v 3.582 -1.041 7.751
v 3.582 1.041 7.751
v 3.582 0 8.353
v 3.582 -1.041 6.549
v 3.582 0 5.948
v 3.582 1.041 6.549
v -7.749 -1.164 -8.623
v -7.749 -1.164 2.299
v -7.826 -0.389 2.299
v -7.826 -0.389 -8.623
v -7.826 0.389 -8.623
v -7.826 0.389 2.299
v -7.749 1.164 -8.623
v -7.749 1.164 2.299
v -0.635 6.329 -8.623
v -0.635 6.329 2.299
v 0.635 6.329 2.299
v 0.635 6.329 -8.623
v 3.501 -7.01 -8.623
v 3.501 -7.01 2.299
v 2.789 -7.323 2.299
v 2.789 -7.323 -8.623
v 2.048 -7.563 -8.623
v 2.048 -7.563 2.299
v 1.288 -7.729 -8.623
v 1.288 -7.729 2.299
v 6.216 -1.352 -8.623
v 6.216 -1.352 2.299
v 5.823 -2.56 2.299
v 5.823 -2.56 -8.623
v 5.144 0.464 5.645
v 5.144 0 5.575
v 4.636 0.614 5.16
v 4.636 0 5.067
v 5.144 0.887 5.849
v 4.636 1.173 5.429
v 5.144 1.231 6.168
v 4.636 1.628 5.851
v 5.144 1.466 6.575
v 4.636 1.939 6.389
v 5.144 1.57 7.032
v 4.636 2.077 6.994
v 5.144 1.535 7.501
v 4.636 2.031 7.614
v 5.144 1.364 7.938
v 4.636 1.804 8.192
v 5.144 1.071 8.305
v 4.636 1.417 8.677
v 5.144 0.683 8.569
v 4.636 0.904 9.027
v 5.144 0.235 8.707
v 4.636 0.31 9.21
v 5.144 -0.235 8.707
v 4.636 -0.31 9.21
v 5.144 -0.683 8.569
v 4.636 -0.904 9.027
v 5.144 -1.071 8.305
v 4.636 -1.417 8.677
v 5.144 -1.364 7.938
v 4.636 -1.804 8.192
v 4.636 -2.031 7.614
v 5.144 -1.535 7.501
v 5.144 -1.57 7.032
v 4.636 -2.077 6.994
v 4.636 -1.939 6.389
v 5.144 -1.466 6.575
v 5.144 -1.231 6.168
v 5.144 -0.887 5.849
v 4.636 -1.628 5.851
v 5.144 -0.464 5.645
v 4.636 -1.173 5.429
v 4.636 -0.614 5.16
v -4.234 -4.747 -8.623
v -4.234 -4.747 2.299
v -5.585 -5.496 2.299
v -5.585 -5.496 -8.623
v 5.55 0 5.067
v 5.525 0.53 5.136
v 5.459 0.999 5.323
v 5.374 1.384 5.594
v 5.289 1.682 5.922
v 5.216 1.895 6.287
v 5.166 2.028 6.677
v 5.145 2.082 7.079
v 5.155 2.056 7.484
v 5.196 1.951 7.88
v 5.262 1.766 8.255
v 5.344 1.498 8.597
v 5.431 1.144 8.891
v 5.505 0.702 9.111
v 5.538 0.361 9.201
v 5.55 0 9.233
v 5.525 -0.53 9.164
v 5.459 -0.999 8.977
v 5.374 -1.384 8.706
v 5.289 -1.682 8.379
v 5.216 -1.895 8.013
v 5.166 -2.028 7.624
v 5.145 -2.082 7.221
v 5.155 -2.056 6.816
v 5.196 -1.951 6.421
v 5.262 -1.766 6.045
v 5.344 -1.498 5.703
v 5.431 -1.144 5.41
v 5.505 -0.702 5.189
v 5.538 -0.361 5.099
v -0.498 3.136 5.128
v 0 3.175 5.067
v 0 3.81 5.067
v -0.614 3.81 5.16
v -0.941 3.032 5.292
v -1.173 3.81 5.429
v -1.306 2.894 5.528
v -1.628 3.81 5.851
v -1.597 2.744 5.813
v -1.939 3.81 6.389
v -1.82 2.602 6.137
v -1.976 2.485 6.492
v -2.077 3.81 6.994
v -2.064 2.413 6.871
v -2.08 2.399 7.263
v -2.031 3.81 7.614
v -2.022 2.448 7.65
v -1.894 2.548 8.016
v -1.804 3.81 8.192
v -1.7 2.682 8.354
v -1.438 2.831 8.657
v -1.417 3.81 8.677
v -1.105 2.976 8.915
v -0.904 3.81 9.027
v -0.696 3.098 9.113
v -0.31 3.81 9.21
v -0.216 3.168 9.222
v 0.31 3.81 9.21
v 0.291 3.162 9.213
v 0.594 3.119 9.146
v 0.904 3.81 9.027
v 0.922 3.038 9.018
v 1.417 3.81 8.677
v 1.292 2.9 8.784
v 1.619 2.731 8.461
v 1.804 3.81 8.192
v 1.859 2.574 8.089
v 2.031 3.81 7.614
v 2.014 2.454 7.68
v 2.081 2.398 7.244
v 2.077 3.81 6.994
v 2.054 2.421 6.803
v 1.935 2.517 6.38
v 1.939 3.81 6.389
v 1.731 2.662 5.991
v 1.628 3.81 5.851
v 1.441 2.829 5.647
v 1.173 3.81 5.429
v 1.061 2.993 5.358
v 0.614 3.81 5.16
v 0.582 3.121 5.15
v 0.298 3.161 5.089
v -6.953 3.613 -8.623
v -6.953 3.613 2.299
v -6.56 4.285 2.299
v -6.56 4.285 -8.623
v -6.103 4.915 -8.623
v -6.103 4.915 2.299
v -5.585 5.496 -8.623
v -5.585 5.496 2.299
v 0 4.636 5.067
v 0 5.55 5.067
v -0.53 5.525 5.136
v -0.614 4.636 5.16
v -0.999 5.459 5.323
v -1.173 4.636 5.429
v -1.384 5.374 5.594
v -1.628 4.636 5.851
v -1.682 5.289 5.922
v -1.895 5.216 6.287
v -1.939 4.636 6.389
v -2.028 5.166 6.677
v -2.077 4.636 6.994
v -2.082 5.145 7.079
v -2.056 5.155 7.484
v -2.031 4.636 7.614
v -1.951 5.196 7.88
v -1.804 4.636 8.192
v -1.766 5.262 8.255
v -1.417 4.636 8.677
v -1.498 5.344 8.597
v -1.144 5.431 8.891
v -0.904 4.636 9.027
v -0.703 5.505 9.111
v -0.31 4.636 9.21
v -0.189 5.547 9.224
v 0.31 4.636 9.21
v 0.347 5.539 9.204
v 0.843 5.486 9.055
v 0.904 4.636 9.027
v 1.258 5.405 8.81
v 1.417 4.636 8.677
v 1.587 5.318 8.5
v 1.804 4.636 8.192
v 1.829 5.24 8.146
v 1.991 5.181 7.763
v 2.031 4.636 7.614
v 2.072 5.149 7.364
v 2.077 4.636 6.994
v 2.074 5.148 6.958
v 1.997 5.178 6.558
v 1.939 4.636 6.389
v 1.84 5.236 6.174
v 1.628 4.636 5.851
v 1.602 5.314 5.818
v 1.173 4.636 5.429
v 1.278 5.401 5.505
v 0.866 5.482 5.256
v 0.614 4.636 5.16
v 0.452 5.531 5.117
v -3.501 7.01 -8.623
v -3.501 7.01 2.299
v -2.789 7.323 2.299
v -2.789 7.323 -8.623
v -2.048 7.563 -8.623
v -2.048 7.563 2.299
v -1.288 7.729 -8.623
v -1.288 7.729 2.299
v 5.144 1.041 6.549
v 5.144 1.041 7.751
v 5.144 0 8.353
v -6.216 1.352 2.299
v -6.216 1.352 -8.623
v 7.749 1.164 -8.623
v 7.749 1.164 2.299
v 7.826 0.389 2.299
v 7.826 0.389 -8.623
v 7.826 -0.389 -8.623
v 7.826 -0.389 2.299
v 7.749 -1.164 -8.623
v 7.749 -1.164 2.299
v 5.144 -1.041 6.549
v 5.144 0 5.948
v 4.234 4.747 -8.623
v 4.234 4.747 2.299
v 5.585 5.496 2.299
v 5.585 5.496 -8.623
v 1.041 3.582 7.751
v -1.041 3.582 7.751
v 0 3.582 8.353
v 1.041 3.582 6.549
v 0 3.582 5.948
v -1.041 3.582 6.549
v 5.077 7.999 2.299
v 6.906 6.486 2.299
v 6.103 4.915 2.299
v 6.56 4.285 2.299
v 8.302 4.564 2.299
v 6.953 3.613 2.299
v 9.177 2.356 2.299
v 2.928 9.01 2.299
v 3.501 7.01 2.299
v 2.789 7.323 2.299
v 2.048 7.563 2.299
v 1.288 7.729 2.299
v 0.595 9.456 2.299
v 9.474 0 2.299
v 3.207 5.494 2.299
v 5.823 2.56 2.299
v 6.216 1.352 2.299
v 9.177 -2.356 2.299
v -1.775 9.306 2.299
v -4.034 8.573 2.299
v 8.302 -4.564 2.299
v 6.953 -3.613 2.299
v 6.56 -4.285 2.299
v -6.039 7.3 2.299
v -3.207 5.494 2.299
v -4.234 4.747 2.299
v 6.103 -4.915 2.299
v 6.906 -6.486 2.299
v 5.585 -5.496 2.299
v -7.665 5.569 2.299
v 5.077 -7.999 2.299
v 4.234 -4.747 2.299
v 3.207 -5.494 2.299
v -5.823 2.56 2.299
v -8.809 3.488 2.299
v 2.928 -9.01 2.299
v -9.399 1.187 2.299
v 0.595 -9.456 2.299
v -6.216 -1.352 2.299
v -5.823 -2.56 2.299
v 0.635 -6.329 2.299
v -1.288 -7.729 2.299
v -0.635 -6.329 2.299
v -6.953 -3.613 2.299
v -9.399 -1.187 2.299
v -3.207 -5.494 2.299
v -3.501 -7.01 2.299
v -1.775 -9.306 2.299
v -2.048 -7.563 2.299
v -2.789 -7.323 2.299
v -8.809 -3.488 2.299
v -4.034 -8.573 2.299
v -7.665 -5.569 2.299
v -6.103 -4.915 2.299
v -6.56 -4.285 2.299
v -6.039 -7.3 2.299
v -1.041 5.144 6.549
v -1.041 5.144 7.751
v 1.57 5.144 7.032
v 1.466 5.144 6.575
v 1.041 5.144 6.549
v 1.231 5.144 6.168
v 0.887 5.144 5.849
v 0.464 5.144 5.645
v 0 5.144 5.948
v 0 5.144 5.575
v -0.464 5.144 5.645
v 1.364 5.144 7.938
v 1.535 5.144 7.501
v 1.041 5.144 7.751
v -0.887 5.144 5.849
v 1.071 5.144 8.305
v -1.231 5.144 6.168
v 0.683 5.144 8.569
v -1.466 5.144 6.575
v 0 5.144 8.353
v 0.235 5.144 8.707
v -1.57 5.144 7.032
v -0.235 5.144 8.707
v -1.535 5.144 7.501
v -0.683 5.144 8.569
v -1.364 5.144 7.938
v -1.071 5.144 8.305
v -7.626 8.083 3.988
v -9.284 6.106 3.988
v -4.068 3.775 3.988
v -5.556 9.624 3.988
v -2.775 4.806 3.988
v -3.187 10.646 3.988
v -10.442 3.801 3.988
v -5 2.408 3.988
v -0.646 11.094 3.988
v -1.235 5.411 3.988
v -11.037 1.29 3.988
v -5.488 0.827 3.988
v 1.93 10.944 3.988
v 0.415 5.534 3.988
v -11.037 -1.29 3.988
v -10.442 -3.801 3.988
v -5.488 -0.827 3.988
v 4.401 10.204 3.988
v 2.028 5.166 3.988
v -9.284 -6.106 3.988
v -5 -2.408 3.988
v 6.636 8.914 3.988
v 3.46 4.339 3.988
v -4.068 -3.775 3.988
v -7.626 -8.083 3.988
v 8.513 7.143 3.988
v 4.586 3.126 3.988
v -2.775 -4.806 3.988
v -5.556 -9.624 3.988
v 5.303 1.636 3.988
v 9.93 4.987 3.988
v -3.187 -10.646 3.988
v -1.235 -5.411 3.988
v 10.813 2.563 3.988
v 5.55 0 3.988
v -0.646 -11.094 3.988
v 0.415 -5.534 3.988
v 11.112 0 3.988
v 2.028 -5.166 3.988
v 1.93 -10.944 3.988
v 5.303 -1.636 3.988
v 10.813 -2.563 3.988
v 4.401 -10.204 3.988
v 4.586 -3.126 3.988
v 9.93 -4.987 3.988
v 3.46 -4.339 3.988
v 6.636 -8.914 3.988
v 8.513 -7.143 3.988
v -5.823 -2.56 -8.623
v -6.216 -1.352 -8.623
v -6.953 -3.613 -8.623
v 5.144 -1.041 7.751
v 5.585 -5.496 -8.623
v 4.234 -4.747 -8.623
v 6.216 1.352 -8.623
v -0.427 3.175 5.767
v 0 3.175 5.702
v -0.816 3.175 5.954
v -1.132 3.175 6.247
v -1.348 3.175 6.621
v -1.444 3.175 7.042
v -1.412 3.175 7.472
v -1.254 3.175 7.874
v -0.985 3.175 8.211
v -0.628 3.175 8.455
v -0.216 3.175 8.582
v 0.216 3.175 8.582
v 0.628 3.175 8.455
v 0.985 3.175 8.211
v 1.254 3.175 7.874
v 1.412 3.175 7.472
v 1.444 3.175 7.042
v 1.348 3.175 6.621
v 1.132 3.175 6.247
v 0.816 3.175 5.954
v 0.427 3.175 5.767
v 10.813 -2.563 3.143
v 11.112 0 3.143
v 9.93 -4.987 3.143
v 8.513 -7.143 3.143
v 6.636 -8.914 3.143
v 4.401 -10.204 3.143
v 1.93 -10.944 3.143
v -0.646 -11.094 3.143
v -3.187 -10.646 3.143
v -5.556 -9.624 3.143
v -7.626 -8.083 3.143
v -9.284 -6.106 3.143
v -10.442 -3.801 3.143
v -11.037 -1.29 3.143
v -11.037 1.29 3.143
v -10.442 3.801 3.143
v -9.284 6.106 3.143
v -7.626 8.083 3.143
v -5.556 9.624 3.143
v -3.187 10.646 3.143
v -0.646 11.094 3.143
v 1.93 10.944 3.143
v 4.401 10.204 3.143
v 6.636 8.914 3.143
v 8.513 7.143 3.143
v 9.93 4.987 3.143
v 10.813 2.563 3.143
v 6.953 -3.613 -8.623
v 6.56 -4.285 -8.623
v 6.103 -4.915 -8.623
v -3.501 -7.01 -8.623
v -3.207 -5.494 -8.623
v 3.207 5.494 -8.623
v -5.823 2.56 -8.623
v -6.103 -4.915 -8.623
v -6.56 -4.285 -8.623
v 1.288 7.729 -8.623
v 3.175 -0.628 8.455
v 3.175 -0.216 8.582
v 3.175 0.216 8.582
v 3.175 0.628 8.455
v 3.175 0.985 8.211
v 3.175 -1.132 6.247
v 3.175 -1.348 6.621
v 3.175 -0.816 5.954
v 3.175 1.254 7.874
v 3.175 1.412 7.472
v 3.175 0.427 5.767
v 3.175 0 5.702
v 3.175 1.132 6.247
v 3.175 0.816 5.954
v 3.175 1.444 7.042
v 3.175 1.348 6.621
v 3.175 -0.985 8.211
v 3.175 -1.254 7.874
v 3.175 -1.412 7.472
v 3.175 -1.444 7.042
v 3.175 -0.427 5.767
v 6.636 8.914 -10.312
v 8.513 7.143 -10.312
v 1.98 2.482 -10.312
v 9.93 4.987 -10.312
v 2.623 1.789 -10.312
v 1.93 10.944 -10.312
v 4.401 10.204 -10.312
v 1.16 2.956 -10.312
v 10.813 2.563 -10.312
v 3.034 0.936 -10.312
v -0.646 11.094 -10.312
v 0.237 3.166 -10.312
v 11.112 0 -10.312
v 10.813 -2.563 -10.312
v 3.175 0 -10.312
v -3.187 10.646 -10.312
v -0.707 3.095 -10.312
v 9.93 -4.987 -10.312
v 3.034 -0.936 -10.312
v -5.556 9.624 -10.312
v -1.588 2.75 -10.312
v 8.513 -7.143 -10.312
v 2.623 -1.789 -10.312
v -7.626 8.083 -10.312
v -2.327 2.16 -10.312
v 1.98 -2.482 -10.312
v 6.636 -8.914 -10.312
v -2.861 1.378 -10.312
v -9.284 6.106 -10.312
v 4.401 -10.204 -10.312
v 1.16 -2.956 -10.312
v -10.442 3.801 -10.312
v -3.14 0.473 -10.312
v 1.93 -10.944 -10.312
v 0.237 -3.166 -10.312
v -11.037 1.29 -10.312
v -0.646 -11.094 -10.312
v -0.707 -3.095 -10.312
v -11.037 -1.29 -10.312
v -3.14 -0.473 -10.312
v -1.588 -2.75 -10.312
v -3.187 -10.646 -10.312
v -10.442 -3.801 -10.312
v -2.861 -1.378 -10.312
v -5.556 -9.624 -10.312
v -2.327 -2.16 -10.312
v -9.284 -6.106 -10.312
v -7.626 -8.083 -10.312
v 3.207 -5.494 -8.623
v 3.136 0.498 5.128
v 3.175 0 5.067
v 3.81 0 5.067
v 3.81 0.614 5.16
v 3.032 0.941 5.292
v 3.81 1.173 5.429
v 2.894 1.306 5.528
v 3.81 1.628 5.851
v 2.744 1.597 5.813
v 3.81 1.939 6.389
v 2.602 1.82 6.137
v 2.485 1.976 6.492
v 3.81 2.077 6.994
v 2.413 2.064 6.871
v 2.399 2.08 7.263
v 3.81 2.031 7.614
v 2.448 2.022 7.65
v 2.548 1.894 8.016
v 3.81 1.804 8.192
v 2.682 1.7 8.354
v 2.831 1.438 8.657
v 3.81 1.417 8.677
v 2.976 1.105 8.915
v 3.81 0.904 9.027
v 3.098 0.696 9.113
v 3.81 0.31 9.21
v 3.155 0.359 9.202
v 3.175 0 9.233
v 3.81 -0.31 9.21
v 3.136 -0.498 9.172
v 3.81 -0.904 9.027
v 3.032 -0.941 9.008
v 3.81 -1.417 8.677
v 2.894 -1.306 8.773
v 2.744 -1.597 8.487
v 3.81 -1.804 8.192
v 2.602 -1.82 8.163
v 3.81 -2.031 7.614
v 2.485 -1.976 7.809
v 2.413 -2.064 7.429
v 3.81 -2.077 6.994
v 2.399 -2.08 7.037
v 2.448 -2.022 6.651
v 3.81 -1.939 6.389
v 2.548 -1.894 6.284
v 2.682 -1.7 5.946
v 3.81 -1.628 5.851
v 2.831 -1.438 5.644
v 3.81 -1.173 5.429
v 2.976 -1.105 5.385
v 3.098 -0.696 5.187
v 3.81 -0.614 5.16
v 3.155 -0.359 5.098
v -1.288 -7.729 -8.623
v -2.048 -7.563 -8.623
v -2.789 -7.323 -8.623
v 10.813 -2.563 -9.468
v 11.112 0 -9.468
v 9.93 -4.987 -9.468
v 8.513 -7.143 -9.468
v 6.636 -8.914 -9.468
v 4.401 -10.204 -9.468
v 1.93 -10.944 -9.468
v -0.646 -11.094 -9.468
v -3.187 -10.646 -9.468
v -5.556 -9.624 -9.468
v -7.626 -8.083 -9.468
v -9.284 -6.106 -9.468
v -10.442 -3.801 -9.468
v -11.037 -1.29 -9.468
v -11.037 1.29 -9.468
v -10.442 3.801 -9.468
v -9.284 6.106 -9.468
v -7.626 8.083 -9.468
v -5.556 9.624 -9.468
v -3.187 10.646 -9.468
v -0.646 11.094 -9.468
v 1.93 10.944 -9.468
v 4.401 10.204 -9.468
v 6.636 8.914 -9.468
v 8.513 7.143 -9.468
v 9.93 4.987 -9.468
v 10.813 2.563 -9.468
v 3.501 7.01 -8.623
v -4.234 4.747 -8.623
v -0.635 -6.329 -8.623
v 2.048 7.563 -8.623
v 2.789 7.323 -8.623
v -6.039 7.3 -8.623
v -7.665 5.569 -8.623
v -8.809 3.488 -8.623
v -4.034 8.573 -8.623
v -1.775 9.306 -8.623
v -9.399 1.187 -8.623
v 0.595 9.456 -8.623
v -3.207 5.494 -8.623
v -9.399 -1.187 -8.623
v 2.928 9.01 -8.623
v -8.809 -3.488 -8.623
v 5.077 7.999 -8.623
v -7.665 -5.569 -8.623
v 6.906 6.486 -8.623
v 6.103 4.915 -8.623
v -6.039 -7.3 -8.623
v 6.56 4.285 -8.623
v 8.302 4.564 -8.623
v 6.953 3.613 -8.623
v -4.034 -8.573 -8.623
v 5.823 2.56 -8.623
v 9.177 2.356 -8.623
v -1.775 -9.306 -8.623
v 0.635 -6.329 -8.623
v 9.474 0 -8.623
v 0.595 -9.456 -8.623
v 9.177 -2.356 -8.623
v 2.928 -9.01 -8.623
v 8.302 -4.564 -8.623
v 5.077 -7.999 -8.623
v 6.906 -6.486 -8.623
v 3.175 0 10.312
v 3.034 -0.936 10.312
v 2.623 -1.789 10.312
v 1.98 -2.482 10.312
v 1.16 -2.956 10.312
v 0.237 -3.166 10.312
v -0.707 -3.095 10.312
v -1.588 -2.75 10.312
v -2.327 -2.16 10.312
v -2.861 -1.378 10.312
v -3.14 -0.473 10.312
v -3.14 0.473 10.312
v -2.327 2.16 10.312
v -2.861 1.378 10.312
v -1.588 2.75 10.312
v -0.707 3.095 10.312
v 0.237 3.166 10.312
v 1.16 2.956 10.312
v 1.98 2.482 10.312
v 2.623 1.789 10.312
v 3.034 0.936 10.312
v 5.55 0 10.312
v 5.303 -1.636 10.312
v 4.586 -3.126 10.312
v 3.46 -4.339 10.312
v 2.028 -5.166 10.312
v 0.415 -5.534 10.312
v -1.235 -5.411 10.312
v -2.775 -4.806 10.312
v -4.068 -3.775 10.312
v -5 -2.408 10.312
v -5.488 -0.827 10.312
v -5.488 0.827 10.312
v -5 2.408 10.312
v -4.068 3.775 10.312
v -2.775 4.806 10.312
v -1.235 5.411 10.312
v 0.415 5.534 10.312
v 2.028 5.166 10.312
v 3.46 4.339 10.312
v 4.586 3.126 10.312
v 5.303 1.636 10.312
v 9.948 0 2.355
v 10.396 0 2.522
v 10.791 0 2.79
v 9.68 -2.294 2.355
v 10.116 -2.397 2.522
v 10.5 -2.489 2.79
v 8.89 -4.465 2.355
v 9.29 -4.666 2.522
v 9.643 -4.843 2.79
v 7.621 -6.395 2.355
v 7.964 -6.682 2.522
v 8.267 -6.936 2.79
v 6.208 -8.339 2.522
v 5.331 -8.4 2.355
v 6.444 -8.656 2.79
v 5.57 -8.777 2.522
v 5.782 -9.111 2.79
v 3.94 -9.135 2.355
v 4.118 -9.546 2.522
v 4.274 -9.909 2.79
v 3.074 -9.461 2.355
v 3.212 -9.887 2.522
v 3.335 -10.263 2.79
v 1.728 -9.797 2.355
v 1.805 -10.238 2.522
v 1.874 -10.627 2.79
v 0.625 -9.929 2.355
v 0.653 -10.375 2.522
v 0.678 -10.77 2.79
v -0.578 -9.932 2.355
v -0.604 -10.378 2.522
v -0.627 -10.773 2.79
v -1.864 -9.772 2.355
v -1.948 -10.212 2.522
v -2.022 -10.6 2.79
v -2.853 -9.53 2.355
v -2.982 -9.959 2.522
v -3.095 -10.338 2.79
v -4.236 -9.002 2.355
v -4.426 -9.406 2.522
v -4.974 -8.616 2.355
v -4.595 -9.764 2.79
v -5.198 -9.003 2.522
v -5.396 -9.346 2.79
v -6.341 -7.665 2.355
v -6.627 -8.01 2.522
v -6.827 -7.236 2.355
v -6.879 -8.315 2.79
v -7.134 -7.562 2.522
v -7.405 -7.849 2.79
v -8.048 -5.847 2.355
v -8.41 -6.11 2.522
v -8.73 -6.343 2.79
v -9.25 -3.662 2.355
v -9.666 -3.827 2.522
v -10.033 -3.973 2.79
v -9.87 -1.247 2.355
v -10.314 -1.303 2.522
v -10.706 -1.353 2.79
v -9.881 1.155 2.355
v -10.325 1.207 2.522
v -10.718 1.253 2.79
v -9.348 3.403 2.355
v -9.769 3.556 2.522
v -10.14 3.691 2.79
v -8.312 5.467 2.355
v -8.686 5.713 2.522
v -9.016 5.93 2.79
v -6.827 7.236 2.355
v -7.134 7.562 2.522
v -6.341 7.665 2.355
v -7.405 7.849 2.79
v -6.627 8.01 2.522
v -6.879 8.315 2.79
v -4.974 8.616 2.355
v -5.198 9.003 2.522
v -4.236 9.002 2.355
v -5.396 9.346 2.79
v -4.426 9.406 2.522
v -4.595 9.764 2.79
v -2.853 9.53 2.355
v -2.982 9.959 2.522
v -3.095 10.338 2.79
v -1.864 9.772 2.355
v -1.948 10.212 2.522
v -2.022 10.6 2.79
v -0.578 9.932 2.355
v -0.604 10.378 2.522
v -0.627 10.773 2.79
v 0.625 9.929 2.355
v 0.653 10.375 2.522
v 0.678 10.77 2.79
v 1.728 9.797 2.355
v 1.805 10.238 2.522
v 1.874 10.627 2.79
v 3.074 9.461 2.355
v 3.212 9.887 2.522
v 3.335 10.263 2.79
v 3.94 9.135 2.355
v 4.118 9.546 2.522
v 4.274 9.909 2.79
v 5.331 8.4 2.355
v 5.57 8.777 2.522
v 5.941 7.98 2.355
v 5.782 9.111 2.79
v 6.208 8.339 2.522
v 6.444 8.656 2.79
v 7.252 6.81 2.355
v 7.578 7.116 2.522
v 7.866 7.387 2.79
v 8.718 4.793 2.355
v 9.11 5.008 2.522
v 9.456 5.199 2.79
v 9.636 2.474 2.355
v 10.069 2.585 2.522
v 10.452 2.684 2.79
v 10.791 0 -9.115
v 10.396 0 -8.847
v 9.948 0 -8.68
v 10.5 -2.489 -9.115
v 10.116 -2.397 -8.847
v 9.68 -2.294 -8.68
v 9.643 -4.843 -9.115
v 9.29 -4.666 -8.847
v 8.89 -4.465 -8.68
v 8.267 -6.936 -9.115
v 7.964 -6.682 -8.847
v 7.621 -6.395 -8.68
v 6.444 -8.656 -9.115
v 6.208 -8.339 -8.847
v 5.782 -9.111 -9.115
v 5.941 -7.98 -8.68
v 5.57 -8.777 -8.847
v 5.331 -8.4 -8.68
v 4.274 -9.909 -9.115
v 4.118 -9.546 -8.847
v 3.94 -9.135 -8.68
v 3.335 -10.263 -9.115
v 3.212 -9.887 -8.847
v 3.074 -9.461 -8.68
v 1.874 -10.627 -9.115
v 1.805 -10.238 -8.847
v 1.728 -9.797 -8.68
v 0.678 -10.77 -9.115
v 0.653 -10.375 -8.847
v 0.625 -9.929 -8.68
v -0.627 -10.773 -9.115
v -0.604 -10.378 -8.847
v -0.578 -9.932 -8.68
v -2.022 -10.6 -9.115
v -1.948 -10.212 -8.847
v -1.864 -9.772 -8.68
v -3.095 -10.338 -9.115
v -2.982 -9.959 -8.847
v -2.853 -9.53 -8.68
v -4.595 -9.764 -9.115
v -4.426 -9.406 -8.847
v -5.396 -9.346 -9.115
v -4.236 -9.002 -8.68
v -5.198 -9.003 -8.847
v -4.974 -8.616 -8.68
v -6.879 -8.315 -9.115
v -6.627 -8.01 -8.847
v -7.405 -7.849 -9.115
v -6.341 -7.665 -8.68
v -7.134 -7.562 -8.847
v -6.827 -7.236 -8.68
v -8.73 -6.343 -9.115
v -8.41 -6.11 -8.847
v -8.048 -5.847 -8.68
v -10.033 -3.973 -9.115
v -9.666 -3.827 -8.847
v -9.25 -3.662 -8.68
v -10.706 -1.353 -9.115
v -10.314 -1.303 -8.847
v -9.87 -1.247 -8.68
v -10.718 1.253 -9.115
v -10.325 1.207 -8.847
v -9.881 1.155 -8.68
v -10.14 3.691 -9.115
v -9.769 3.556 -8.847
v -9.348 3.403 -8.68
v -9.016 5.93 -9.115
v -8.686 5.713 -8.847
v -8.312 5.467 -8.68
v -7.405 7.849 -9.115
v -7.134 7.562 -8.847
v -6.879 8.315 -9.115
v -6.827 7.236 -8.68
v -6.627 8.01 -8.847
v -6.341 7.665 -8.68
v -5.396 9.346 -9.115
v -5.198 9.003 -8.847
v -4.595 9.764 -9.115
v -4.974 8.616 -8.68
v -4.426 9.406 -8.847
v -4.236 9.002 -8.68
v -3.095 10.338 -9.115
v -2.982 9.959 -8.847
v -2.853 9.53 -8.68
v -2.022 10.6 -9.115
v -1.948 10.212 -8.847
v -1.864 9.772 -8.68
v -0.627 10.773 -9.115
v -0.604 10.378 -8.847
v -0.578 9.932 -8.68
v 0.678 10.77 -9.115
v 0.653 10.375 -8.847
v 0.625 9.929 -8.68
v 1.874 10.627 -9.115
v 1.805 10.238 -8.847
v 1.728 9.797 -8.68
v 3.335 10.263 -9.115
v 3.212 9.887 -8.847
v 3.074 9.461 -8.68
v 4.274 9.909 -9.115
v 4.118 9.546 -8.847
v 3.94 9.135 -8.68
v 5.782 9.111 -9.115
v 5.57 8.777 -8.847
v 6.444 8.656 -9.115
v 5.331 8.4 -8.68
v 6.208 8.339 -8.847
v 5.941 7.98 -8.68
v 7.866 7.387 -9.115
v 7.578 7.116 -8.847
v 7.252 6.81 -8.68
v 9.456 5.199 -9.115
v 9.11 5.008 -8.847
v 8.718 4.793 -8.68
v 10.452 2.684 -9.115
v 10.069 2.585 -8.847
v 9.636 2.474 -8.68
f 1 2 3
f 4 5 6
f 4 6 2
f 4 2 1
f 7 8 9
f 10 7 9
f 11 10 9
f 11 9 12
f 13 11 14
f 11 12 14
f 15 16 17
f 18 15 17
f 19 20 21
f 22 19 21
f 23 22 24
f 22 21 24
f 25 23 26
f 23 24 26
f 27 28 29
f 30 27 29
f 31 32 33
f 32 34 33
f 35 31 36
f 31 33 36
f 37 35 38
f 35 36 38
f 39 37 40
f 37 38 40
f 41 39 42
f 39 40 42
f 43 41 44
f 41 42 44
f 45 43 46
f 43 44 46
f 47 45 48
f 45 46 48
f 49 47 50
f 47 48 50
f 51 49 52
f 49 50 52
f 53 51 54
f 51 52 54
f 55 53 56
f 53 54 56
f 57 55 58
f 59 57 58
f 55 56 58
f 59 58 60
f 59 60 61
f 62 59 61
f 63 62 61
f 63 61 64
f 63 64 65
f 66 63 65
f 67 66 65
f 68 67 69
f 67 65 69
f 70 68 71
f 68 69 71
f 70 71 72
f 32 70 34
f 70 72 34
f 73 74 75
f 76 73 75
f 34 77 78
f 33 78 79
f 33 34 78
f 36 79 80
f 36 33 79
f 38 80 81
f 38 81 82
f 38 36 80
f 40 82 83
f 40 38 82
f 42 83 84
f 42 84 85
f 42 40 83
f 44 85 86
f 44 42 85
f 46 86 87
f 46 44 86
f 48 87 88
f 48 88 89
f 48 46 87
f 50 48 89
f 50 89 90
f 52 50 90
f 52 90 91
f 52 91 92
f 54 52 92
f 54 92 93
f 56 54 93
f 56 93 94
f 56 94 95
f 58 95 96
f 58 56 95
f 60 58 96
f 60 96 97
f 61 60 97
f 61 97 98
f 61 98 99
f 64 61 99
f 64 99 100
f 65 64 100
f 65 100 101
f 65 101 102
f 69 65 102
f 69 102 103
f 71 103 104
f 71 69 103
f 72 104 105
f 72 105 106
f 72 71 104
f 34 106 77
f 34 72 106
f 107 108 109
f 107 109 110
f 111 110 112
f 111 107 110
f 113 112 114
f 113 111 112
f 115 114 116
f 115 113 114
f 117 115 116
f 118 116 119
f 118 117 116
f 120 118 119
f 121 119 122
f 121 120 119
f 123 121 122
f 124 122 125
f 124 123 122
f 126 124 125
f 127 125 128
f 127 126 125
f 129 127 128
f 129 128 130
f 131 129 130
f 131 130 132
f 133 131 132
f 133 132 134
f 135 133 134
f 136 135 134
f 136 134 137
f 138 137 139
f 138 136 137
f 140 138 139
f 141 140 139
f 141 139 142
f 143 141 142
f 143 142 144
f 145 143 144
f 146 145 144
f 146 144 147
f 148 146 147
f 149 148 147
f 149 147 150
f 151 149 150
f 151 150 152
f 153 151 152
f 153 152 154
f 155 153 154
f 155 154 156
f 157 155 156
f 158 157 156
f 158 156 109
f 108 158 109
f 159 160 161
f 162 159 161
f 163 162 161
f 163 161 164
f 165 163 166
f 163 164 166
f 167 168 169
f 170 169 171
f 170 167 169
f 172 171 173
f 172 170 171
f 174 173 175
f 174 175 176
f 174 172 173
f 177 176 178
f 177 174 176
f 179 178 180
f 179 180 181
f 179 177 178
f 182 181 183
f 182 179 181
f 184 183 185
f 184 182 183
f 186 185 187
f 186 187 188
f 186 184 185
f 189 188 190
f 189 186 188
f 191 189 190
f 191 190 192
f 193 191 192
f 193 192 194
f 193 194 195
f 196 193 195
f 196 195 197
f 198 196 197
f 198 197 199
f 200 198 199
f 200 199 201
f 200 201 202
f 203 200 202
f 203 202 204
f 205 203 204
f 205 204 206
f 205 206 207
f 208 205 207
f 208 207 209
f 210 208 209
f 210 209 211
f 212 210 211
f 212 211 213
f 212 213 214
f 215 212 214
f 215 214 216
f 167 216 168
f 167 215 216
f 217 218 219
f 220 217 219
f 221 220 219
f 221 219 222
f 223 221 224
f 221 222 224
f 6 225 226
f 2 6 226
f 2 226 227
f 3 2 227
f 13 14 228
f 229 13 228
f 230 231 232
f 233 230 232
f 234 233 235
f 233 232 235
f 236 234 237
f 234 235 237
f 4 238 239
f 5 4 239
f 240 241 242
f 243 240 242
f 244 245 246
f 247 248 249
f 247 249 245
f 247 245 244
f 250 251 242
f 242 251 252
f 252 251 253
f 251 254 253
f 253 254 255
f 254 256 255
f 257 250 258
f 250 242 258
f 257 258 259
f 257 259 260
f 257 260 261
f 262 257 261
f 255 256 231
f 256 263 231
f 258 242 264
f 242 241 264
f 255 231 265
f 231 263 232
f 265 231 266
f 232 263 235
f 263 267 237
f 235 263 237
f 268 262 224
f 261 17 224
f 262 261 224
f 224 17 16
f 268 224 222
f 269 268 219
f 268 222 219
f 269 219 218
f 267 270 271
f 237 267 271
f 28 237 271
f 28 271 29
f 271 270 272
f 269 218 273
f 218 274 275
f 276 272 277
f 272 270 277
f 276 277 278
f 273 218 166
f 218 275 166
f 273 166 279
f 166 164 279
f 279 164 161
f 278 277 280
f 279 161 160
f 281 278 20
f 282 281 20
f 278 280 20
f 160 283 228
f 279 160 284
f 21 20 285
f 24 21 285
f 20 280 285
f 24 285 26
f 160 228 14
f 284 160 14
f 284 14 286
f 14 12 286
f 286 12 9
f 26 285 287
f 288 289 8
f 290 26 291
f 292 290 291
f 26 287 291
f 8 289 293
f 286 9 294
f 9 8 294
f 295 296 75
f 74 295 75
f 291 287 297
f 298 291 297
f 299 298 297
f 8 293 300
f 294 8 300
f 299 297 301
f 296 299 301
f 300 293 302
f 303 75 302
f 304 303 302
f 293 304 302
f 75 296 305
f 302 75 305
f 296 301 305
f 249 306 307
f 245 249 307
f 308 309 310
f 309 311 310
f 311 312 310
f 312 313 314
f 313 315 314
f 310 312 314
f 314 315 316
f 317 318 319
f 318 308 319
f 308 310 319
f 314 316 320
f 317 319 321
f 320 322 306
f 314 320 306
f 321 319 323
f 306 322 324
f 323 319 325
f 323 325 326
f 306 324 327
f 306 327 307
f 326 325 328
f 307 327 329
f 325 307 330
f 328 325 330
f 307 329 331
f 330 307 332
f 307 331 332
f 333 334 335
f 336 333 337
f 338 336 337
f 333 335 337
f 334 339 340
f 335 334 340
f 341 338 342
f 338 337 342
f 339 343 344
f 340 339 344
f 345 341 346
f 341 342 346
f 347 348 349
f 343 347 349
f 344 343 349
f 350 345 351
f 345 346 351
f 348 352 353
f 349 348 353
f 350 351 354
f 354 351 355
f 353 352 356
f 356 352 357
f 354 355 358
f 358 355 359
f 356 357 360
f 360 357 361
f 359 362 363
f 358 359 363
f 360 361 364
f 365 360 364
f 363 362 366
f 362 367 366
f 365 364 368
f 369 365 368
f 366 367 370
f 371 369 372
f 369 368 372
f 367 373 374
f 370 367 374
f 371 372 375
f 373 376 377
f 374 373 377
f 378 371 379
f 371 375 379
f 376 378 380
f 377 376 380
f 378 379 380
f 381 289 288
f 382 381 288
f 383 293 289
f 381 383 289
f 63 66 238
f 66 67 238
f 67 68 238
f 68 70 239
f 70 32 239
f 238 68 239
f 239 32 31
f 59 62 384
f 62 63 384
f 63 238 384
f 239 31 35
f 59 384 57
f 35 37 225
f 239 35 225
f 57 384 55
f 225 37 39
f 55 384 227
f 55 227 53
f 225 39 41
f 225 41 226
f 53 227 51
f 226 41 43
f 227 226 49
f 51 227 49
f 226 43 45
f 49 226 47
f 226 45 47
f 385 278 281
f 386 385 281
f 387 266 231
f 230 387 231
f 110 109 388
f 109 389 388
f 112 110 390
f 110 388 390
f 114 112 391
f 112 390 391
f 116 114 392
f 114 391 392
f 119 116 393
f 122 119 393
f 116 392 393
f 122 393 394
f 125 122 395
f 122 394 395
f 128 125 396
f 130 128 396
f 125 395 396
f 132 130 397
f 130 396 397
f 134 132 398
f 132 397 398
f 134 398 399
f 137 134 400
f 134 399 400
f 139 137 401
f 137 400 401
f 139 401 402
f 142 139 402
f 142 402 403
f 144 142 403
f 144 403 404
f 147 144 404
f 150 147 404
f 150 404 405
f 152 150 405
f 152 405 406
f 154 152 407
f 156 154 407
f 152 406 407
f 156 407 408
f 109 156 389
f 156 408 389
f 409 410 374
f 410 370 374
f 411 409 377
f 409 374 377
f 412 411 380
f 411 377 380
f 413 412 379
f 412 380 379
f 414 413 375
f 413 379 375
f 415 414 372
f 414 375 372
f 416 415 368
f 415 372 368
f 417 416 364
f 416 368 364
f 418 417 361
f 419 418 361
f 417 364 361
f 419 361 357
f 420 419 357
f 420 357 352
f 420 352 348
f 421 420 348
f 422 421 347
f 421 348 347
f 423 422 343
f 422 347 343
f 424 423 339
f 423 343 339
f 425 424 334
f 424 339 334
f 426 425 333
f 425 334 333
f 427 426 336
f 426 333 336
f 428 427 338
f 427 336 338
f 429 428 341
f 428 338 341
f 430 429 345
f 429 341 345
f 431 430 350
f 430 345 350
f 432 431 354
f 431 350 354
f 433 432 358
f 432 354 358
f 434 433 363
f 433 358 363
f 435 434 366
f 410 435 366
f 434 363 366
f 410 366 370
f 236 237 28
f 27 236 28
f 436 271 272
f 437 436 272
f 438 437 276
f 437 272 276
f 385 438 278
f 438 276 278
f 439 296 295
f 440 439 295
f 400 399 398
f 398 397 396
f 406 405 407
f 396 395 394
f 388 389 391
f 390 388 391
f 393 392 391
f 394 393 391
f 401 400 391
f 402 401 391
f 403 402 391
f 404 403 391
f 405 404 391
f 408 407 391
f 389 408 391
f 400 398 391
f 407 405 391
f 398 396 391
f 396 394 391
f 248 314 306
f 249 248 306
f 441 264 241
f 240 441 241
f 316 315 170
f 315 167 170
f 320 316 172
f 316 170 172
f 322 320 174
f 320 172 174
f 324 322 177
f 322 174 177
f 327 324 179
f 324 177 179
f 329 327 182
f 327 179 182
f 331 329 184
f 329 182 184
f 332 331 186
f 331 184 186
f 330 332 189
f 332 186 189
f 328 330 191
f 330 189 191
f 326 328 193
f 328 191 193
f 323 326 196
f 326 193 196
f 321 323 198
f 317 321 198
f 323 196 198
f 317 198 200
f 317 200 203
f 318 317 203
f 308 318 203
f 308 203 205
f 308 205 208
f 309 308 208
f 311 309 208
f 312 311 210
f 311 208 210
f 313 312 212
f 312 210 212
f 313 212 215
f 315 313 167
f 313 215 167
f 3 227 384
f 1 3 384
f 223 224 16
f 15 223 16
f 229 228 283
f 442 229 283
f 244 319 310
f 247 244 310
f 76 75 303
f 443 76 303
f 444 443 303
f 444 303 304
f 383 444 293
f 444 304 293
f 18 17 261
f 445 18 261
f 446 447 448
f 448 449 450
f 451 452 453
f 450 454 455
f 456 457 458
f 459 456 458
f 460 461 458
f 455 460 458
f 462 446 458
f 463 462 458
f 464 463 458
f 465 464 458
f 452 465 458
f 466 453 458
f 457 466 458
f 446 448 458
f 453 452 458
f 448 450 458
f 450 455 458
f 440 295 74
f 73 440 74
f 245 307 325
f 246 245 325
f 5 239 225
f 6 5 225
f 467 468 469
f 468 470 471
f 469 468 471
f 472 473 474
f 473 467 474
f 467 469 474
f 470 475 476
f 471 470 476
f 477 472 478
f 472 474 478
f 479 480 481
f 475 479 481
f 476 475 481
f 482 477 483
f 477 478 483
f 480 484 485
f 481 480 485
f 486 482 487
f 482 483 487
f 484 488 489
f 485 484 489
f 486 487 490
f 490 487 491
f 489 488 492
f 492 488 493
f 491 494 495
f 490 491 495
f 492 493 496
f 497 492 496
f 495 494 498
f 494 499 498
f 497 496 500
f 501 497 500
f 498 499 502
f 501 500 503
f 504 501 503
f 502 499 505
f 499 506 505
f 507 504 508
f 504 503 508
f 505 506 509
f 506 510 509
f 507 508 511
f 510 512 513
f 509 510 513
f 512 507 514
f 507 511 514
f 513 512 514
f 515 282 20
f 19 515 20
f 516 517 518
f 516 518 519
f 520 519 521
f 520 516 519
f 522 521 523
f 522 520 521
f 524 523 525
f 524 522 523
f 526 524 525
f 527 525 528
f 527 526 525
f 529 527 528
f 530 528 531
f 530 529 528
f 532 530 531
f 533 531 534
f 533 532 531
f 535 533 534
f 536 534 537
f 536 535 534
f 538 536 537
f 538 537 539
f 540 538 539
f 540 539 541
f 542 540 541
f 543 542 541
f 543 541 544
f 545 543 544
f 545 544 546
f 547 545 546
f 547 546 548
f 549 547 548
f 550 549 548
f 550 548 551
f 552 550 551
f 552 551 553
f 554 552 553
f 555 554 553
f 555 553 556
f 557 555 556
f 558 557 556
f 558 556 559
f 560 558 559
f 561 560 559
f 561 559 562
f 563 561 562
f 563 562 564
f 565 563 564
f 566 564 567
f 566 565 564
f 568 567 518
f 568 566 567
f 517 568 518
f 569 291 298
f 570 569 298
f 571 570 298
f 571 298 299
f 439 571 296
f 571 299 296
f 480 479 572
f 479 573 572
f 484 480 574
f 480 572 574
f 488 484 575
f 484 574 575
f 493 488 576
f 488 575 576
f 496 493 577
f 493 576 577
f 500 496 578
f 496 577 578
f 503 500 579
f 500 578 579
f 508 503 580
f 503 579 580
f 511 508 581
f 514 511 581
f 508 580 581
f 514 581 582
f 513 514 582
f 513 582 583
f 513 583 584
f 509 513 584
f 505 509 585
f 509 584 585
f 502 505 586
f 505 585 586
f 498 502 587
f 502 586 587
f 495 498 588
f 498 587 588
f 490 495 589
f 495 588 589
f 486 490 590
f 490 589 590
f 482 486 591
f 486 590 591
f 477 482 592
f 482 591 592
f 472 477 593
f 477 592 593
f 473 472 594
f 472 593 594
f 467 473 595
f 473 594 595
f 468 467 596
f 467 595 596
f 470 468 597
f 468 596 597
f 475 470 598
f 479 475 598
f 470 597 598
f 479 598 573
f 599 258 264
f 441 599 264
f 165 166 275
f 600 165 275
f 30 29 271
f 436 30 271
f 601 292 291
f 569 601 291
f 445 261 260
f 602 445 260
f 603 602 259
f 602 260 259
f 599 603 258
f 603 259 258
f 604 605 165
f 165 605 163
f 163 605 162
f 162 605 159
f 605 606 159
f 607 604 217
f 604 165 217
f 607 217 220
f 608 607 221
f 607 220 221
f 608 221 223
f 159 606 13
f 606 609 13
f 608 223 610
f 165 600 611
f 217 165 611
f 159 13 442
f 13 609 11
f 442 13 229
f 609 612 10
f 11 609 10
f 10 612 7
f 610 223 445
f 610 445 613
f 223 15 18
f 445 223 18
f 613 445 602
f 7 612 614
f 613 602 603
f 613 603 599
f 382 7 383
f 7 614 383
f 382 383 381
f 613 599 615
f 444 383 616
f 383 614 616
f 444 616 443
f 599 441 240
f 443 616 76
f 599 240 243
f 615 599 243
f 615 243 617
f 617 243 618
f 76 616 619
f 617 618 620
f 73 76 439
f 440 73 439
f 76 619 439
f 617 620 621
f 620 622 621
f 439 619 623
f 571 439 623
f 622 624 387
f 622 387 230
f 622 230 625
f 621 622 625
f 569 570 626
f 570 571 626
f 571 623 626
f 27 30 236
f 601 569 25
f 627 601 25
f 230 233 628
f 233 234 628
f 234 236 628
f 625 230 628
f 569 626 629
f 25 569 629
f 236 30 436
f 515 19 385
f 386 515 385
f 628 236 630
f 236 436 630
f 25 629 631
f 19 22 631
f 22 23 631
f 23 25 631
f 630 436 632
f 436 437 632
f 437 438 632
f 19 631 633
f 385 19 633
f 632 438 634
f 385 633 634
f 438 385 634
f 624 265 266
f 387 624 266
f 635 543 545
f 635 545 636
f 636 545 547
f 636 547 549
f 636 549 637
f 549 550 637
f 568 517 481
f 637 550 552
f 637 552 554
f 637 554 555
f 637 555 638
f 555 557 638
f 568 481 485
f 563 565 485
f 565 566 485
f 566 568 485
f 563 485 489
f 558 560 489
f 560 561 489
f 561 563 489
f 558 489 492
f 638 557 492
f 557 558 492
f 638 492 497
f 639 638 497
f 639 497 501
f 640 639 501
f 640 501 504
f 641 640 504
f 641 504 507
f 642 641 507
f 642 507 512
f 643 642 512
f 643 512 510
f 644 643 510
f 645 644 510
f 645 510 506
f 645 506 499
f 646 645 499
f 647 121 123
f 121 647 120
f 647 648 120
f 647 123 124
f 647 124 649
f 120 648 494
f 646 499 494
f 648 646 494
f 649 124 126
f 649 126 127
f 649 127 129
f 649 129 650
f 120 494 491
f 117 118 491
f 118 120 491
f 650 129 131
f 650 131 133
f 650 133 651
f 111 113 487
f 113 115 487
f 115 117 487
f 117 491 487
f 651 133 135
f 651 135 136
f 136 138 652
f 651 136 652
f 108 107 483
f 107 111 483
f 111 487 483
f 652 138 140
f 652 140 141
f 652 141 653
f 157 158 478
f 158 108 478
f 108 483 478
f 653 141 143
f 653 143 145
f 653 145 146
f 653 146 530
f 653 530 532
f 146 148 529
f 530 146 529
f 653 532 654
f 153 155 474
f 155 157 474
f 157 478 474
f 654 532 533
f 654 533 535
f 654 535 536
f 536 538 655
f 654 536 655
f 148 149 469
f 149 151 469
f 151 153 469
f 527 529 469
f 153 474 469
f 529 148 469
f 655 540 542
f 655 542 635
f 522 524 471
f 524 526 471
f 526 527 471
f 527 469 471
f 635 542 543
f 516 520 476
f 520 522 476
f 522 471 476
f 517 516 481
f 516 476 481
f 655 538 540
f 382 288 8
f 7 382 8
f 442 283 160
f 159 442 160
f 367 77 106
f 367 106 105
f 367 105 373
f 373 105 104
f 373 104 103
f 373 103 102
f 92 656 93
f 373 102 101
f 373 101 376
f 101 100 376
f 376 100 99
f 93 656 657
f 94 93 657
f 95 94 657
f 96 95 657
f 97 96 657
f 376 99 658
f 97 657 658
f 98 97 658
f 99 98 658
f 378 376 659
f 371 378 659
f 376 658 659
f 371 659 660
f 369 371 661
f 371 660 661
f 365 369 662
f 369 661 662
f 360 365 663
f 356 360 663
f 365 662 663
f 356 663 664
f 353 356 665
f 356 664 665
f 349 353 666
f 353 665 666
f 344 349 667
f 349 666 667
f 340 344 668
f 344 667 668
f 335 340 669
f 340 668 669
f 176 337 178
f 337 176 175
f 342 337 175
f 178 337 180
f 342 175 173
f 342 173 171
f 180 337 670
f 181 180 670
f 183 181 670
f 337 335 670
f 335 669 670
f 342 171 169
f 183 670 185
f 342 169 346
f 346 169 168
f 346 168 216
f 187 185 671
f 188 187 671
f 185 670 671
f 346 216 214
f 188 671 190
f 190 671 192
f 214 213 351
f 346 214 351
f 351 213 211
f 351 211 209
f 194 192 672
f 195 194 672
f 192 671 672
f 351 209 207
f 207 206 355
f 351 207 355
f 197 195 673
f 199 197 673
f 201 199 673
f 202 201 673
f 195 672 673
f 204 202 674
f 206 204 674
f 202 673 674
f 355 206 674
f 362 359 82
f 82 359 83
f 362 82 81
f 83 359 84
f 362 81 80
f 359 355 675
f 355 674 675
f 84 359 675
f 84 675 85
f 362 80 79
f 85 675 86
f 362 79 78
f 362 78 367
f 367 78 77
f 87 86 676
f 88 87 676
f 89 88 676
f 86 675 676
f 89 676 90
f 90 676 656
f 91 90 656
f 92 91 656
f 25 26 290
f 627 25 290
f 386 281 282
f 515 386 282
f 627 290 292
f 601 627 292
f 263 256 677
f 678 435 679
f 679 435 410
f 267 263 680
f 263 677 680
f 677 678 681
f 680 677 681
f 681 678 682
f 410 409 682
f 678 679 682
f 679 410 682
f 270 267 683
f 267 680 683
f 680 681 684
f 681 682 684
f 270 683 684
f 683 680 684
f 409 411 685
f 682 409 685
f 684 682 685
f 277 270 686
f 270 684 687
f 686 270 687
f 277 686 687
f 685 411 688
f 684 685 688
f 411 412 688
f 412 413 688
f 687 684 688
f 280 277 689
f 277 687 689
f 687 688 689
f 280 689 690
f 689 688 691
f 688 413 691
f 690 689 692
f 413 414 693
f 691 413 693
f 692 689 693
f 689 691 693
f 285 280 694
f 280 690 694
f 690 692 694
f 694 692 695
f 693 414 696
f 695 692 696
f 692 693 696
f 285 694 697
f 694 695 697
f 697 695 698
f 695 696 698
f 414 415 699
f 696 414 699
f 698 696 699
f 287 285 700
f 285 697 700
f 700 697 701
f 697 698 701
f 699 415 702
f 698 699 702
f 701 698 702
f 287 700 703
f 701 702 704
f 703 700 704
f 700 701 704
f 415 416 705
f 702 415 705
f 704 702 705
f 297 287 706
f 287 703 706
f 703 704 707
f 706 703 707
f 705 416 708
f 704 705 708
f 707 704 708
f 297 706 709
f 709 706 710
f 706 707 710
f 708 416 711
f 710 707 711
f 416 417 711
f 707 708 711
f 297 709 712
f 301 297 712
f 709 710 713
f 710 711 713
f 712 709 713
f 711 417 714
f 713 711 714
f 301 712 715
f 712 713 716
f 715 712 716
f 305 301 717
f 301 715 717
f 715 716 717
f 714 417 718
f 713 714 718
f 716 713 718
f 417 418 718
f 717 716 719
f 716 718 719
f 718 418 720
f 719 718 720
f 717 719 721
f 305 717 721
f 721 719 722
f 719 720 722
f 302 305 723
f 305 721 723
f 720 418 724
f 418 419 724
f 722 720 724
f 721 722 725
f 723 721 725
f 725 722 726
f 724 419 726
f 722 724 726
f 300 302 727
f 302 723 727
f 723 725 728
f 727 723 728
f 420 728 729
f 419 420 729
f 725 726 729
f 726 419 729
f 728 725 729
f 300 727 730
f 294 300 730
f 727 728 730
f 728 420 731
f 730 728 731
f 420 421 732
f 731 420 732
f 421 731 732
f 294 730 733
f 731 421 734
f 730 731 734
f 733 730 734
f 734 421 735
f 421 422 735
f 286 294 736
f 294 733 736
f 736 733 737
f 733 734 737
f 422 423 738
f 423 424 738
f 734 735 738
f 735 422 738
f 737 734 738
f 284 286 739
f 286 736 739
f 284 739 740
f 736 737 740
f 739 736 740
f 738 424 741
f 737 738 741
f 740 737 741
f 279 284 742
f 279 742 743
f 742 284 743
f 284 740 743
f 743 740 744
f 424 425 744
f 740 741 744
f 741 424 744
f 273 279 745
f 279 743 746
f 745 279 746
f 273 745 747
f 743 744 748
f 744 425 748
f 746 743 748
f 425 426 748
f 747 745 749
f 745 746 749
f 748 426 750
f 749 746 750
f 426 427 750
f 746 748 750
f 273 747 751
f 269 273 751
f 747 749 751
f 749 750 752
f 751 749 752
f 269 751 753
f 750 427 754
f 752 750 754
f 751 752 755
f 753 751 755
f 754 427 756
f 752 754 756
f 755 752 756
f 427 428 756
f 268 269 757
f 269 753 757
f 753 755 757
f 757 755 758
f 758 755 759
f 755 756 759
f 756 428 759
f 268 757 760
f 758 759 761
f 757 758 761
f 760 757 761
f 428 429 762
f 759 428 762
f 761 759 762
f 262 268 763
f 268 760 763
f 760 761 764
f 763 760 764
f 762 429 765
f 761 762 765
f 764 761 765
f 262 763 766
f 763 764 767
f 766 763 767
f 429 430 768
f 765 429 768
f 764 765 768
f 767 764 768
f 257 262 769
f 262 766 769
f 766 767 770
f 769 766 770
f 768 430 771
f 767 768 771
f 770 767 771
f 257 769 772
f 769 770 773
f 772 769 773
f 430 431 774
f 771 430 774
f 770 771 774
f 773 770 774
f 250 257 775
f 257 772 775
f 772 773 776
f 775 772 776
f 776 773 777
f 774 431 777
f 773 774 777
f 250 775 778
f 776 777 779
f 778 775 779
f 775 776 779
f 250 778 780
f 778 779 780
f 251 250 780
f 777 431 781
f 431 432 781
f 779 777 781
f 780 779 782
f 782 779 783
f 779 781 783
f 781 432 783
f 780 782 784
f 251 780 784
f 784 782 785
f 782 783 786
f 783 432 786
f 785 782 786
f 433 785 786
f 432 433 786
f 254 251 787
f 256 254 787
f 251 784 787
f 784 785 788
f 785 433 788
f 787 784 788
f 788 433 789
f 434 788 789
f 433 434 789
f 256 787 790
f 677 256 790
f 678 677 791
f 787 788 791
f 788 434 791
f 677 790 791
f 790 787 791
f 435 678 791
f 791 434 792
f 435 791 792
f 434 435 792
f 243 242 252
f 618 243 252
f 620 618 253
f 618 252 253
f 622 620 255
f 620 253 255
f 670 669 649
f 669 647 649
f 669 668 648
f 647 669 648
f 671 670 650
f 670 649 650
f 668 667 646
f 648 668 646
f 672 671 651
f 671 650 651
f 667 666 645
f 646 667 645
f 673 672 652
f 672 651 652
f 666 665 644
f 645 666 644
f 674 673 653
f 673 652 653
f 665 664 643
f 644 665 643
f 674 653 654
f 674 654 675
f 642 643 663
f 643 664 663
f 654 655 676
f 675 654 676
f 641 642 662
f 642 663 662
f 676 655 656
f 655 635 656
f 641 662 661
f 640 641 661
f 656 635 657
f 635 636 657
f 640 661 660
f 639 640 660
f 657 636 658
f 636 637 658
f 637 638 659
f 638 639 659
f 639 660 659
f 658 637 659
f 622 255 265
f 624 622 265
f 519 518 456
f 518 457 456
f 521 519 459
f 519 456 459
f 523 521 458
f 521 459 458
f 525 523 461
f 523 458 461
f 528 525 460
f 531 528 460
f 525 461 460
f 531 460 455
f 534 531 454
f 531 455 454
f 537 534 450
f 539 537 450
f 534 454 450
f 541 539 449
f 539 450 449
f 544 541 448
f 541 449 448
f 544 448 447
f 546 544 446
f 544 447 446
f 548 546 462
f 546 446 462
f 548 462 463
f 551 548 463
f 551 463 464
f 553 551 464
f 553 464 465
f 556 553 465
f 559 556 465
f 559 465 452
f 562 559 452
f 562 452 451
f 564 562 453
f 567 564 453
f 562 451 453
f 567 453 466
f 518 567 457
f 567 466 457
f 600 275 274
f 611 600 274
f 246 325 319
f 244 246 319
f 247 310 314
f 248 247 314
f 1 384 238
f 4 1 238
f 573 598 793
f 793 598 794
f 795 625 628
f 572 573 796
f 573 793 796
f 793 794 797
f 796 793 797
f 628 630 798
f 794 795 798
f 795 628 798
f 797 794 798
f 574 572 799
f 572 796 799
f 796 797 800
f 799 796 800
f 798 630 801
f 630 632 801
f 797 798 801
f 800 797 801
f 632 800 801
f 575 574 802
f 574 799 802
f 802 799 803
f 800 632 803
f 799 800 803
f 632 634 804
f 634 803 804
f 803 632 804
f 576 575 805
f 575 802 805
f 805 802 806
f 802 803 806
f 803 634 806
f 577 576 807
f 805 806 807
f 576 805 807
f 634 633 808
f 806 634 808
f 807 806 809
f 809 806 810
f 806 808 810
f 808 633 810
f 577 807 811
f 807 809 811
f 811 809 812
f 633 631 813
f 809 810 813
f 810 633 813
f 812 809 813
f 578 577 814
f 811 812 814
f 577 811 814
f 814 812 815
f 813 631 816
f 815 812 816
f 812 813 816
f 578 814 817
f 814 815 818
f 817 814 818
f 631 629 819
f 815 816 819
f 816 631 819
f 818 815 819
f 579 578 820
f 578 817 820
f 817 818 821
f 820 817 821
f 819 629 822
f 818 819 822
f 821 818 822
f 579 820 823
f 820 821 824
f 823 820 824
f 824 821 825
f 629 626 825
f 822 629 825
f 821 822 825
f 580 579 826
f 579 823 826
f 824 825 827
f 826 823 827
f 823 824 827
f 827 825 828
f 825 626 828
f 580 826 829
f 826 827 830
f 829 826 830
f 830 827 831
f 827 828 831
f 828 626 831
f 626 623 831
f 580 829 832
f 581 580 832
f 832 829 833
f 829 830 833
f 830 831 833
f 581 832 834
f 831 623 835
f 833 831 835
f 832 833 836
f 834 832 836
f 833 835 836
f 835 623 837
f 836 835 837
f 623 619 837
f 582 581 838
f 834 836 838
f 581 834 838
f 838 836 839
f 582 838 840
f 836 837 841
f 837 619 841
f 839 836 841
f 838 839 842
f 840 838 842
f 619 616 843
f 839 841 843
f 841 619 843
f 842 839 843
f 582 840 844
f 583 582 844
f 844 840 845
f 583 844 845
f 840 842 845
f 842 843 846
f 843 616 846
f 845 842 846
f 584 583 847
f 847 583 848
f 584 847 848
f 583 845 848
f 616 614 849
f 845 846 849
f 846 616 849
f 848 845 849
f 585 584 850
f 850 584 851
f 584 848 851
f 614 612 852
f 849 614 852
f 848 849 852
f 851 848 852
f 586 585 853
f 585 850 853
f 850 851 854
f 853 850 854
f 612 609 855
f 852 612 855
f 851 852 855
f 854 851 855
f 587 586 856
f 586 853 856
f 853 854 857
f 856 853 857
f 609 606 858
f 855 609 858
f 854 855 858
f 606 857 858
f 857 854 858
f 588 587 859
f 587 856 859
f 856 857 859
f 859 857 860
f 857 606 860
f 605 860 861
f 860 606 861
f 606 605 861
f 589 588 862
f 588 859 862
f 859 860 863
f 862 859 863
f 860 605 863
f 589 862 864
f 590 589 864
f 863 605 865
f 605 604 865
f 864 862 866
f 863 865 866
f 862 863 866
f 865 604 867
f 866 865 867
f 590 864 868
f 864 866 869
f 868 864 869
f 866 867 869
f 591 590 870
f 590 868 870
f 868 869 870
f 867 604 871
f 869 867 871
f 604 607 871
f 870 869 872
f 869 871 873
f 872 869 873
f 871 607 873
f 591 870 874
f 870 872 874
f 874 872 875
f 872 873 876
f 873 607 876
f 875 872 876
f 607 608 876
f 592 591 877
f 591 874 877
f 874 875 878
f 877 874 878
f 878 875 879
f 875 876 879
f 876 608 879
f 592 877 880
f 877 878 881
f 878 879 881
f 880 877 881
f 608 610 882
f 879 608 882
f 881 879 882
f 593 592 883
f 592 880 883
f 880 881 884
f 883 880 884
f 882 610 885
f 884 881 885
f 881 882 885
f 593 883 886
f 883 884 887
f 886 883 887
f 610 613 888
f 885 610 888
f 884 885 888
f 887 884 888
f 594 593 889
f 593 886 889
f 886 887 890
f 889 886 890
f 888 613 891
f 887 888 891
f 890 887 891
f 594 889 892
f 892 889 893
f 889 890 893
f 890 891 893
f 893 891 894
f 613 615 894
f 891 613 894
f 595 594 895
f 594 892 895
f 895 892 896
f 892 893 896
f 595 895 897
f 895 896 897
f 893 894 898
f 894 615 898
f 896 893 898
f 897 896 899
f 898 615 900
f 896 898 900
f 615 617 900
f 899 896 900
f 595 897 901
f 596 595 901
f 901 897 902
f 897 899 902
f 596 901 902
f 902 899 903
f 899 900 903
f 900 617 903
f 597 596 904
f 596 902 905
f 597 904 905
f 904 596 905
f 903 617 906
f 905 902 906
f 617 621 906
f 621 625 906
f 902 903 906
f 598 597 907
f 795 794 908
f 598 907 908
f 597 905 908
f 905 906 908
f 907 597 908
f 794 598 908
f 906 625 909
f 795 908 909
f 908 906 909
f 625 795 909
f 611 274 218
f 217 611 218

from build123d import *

# Parameters (mm, degrees)
CUT_EXTRUDE1_START = 2.2987
CUT_EXTRUDE1_DEPTH = 10.922
CIRPATTERN1_COUNT  = 10
SKETCH4_R          = 2.0828
CUT_EXTRUDE2_DEPTH = 19.796832346
CUT_EXTRUDE3_DEPTH = 1.5621
CIRPATTERN2_COUNT  = 2
CIRPATTERN2_ANGLE  = 90


with BuildPart() as part:
    # Sketch2 → Revolve1 (revolve)
    with BuildSketch(Plane(origin=(0, 0, 0), x_dir=(0, 0, -1), z_dir=(1, 0, 0)), mode=Mode.PRIVATE) as revolve1_sk:
        with BuildLine():
            Line((-10.3124, 3.175), (10.3124, 3.175))
            Line((10.3124, 3.175), (10.3124, 11.1125))
            Line((10.3124, 11.1125), (9.46785, 11.1125))
            ThreePointArc((9.46785, 11.1125), (8.846862309, 10.395787163), (8.6233, 9.4742))
            Line((8.6233, 9.4742), (8.6233, 7.8359))
            Line((8.6233, 7.8359), (-2.2987, 7.8359))
            Line((-2.2987, 7.8359), (-2.2987, 9.4742))
            ThreePointArc((-2.2987, 9.4742), (-2.522262309, 10.395787163), (-3.14325, 11.1125))
            Line((-3.14325, 11.1125), (-3.9878, 11.1125))
            Line((-3.9878, 11.1125), (-3.9878, 5.5499))
            Line((-3.9878, 5.5499), (-10.3124, 5.5499))
            Line((-10.3124, 5.5499), (-10.3124, 3.175))
        make_face()
    revolve(revolve1_sk.sketch.rotate(Axis((0, 0, 10.3124), (0, 0, -1)), 90), axis=Axis((0, 0, 10.3124), (0, 0, -1)))

    # Sketch3 → Cut-Extrude1 (cut)
    with BuildSketch(Plane.XY.offset(CUT_EXTRUDE1_START)):
        with BuildLine():
            Line((-0.635, 6.329348022), (0.635, 6.329348022))
            Line((0.635, 6.329348022), (1.287830721, 7.729348022))
            ThreePointArc((1.287830721, 7.729348022), (0, 7.8359), (-1.287830721, 7.729348022))
            Line((-1.287830721, 7.729348022), (-0.635, 6.329348022))
        make_face()
    cut_extrude1 = extrude(amount=-CUT_EXTRUDE1_DEPTH, mode=Mode.SUBTRACT)

    # CirPattern1: Cut-Extrude1 ×10 about axis
    cirpattern1_axis = Axis((0, 0, 0), (0, 0, 1))
    for i in range(1, CIRPATTERN1_COUNT):
        add(cut_extrude1.rotate(cirpattern1_axis, i * 360 / CIRPATTERN1_COUNT), mode=Mode.SUBTRACT)

    # Sketch4 → Cut-Extrude2 (cut, through all)
    with BuildSketch(Plane(origin=(0, 0, 0), x_dir=(1, 0, 0), z_dir=(0, 1, 0))):
        with Locations(Location((0, -7.1501, 0), (0, 0, 90))):
            Circle(SKETCH4_R)
    cut_extrude2 = extrude(amount=CUT_EXTRUDE2_DEPTH, mode=Mode.SUBTRACT)

    # Sketch5 → Revolve2 (revolve)
    with BuildSketch(Plane.XY.offset(7.1501), mode=Mode.PRIVATE) as revolve2_sk:
        Polygon((1.5748, 5.144252538), (2.0828, 4.636252538), (2.0828, 3.81), (1.4478, 3.175), (0, 3.175), (0, 5.144252538), align=None)
    revolve2 = revolve(revolve2_sk.sketch.rotate(Axis((0, 0, 7.1501), (0, 1, 0)), 90), axis=Axis((0, 0, 7.1501), (0, 1, 0)))

    # Sketch6 → Cut-Extrude3 (cut)
    with BuildSketch(Plane(origin=(0, 5.144252538, 0), x_dir=(1, 0, 0), z_dir=(0, 1, 0))):
        Polygon((0, -5.947594859), (-1.0414, -6.54884743), (-1.0414, -7.75135257), (0, -8.352605141), (1.0414, -7.75135257), (1.0414, -6.54884743), align=None)
    cut_extrude3 = extrude(amount=-CUT_EXTRUDE3_DEPTH, mode=Mode.SUBTRACT)

    # CirPattern2: Cut-Extrude2, Revolve2, Cut-Extrude3 ×2 about axis
    cirpattern2_axis = Axis((0, 0, 0), (0, 0, -1))
    add([cut_extrude2.rotate(cirpattern2_axis, i * CIRPATTERN2_ANGLE / (CIRPATTERN2_COUNT - 1)) for i in range(1, CIRPATTERN2_COUNT)], mode=Mode.SUBTRACT)
    add([revolve2.rotate(cirpattern2_axis, i * CIRPATTERN2_ANGLE / (CIRPATTERN2_COUNT - 1)) for i in range(1, CIRPATTERN2_COUNT)])
    add([cut_extrude3.rotate(cirpattern2_axis, i * CIRPATTERN2_ANGLE / (CIRPATTERN2_COUNT - 1)) for i in range(1, CIRPATTERN2_COUNT)], mode=Mode.SUBTRACT)


solid = part.part
